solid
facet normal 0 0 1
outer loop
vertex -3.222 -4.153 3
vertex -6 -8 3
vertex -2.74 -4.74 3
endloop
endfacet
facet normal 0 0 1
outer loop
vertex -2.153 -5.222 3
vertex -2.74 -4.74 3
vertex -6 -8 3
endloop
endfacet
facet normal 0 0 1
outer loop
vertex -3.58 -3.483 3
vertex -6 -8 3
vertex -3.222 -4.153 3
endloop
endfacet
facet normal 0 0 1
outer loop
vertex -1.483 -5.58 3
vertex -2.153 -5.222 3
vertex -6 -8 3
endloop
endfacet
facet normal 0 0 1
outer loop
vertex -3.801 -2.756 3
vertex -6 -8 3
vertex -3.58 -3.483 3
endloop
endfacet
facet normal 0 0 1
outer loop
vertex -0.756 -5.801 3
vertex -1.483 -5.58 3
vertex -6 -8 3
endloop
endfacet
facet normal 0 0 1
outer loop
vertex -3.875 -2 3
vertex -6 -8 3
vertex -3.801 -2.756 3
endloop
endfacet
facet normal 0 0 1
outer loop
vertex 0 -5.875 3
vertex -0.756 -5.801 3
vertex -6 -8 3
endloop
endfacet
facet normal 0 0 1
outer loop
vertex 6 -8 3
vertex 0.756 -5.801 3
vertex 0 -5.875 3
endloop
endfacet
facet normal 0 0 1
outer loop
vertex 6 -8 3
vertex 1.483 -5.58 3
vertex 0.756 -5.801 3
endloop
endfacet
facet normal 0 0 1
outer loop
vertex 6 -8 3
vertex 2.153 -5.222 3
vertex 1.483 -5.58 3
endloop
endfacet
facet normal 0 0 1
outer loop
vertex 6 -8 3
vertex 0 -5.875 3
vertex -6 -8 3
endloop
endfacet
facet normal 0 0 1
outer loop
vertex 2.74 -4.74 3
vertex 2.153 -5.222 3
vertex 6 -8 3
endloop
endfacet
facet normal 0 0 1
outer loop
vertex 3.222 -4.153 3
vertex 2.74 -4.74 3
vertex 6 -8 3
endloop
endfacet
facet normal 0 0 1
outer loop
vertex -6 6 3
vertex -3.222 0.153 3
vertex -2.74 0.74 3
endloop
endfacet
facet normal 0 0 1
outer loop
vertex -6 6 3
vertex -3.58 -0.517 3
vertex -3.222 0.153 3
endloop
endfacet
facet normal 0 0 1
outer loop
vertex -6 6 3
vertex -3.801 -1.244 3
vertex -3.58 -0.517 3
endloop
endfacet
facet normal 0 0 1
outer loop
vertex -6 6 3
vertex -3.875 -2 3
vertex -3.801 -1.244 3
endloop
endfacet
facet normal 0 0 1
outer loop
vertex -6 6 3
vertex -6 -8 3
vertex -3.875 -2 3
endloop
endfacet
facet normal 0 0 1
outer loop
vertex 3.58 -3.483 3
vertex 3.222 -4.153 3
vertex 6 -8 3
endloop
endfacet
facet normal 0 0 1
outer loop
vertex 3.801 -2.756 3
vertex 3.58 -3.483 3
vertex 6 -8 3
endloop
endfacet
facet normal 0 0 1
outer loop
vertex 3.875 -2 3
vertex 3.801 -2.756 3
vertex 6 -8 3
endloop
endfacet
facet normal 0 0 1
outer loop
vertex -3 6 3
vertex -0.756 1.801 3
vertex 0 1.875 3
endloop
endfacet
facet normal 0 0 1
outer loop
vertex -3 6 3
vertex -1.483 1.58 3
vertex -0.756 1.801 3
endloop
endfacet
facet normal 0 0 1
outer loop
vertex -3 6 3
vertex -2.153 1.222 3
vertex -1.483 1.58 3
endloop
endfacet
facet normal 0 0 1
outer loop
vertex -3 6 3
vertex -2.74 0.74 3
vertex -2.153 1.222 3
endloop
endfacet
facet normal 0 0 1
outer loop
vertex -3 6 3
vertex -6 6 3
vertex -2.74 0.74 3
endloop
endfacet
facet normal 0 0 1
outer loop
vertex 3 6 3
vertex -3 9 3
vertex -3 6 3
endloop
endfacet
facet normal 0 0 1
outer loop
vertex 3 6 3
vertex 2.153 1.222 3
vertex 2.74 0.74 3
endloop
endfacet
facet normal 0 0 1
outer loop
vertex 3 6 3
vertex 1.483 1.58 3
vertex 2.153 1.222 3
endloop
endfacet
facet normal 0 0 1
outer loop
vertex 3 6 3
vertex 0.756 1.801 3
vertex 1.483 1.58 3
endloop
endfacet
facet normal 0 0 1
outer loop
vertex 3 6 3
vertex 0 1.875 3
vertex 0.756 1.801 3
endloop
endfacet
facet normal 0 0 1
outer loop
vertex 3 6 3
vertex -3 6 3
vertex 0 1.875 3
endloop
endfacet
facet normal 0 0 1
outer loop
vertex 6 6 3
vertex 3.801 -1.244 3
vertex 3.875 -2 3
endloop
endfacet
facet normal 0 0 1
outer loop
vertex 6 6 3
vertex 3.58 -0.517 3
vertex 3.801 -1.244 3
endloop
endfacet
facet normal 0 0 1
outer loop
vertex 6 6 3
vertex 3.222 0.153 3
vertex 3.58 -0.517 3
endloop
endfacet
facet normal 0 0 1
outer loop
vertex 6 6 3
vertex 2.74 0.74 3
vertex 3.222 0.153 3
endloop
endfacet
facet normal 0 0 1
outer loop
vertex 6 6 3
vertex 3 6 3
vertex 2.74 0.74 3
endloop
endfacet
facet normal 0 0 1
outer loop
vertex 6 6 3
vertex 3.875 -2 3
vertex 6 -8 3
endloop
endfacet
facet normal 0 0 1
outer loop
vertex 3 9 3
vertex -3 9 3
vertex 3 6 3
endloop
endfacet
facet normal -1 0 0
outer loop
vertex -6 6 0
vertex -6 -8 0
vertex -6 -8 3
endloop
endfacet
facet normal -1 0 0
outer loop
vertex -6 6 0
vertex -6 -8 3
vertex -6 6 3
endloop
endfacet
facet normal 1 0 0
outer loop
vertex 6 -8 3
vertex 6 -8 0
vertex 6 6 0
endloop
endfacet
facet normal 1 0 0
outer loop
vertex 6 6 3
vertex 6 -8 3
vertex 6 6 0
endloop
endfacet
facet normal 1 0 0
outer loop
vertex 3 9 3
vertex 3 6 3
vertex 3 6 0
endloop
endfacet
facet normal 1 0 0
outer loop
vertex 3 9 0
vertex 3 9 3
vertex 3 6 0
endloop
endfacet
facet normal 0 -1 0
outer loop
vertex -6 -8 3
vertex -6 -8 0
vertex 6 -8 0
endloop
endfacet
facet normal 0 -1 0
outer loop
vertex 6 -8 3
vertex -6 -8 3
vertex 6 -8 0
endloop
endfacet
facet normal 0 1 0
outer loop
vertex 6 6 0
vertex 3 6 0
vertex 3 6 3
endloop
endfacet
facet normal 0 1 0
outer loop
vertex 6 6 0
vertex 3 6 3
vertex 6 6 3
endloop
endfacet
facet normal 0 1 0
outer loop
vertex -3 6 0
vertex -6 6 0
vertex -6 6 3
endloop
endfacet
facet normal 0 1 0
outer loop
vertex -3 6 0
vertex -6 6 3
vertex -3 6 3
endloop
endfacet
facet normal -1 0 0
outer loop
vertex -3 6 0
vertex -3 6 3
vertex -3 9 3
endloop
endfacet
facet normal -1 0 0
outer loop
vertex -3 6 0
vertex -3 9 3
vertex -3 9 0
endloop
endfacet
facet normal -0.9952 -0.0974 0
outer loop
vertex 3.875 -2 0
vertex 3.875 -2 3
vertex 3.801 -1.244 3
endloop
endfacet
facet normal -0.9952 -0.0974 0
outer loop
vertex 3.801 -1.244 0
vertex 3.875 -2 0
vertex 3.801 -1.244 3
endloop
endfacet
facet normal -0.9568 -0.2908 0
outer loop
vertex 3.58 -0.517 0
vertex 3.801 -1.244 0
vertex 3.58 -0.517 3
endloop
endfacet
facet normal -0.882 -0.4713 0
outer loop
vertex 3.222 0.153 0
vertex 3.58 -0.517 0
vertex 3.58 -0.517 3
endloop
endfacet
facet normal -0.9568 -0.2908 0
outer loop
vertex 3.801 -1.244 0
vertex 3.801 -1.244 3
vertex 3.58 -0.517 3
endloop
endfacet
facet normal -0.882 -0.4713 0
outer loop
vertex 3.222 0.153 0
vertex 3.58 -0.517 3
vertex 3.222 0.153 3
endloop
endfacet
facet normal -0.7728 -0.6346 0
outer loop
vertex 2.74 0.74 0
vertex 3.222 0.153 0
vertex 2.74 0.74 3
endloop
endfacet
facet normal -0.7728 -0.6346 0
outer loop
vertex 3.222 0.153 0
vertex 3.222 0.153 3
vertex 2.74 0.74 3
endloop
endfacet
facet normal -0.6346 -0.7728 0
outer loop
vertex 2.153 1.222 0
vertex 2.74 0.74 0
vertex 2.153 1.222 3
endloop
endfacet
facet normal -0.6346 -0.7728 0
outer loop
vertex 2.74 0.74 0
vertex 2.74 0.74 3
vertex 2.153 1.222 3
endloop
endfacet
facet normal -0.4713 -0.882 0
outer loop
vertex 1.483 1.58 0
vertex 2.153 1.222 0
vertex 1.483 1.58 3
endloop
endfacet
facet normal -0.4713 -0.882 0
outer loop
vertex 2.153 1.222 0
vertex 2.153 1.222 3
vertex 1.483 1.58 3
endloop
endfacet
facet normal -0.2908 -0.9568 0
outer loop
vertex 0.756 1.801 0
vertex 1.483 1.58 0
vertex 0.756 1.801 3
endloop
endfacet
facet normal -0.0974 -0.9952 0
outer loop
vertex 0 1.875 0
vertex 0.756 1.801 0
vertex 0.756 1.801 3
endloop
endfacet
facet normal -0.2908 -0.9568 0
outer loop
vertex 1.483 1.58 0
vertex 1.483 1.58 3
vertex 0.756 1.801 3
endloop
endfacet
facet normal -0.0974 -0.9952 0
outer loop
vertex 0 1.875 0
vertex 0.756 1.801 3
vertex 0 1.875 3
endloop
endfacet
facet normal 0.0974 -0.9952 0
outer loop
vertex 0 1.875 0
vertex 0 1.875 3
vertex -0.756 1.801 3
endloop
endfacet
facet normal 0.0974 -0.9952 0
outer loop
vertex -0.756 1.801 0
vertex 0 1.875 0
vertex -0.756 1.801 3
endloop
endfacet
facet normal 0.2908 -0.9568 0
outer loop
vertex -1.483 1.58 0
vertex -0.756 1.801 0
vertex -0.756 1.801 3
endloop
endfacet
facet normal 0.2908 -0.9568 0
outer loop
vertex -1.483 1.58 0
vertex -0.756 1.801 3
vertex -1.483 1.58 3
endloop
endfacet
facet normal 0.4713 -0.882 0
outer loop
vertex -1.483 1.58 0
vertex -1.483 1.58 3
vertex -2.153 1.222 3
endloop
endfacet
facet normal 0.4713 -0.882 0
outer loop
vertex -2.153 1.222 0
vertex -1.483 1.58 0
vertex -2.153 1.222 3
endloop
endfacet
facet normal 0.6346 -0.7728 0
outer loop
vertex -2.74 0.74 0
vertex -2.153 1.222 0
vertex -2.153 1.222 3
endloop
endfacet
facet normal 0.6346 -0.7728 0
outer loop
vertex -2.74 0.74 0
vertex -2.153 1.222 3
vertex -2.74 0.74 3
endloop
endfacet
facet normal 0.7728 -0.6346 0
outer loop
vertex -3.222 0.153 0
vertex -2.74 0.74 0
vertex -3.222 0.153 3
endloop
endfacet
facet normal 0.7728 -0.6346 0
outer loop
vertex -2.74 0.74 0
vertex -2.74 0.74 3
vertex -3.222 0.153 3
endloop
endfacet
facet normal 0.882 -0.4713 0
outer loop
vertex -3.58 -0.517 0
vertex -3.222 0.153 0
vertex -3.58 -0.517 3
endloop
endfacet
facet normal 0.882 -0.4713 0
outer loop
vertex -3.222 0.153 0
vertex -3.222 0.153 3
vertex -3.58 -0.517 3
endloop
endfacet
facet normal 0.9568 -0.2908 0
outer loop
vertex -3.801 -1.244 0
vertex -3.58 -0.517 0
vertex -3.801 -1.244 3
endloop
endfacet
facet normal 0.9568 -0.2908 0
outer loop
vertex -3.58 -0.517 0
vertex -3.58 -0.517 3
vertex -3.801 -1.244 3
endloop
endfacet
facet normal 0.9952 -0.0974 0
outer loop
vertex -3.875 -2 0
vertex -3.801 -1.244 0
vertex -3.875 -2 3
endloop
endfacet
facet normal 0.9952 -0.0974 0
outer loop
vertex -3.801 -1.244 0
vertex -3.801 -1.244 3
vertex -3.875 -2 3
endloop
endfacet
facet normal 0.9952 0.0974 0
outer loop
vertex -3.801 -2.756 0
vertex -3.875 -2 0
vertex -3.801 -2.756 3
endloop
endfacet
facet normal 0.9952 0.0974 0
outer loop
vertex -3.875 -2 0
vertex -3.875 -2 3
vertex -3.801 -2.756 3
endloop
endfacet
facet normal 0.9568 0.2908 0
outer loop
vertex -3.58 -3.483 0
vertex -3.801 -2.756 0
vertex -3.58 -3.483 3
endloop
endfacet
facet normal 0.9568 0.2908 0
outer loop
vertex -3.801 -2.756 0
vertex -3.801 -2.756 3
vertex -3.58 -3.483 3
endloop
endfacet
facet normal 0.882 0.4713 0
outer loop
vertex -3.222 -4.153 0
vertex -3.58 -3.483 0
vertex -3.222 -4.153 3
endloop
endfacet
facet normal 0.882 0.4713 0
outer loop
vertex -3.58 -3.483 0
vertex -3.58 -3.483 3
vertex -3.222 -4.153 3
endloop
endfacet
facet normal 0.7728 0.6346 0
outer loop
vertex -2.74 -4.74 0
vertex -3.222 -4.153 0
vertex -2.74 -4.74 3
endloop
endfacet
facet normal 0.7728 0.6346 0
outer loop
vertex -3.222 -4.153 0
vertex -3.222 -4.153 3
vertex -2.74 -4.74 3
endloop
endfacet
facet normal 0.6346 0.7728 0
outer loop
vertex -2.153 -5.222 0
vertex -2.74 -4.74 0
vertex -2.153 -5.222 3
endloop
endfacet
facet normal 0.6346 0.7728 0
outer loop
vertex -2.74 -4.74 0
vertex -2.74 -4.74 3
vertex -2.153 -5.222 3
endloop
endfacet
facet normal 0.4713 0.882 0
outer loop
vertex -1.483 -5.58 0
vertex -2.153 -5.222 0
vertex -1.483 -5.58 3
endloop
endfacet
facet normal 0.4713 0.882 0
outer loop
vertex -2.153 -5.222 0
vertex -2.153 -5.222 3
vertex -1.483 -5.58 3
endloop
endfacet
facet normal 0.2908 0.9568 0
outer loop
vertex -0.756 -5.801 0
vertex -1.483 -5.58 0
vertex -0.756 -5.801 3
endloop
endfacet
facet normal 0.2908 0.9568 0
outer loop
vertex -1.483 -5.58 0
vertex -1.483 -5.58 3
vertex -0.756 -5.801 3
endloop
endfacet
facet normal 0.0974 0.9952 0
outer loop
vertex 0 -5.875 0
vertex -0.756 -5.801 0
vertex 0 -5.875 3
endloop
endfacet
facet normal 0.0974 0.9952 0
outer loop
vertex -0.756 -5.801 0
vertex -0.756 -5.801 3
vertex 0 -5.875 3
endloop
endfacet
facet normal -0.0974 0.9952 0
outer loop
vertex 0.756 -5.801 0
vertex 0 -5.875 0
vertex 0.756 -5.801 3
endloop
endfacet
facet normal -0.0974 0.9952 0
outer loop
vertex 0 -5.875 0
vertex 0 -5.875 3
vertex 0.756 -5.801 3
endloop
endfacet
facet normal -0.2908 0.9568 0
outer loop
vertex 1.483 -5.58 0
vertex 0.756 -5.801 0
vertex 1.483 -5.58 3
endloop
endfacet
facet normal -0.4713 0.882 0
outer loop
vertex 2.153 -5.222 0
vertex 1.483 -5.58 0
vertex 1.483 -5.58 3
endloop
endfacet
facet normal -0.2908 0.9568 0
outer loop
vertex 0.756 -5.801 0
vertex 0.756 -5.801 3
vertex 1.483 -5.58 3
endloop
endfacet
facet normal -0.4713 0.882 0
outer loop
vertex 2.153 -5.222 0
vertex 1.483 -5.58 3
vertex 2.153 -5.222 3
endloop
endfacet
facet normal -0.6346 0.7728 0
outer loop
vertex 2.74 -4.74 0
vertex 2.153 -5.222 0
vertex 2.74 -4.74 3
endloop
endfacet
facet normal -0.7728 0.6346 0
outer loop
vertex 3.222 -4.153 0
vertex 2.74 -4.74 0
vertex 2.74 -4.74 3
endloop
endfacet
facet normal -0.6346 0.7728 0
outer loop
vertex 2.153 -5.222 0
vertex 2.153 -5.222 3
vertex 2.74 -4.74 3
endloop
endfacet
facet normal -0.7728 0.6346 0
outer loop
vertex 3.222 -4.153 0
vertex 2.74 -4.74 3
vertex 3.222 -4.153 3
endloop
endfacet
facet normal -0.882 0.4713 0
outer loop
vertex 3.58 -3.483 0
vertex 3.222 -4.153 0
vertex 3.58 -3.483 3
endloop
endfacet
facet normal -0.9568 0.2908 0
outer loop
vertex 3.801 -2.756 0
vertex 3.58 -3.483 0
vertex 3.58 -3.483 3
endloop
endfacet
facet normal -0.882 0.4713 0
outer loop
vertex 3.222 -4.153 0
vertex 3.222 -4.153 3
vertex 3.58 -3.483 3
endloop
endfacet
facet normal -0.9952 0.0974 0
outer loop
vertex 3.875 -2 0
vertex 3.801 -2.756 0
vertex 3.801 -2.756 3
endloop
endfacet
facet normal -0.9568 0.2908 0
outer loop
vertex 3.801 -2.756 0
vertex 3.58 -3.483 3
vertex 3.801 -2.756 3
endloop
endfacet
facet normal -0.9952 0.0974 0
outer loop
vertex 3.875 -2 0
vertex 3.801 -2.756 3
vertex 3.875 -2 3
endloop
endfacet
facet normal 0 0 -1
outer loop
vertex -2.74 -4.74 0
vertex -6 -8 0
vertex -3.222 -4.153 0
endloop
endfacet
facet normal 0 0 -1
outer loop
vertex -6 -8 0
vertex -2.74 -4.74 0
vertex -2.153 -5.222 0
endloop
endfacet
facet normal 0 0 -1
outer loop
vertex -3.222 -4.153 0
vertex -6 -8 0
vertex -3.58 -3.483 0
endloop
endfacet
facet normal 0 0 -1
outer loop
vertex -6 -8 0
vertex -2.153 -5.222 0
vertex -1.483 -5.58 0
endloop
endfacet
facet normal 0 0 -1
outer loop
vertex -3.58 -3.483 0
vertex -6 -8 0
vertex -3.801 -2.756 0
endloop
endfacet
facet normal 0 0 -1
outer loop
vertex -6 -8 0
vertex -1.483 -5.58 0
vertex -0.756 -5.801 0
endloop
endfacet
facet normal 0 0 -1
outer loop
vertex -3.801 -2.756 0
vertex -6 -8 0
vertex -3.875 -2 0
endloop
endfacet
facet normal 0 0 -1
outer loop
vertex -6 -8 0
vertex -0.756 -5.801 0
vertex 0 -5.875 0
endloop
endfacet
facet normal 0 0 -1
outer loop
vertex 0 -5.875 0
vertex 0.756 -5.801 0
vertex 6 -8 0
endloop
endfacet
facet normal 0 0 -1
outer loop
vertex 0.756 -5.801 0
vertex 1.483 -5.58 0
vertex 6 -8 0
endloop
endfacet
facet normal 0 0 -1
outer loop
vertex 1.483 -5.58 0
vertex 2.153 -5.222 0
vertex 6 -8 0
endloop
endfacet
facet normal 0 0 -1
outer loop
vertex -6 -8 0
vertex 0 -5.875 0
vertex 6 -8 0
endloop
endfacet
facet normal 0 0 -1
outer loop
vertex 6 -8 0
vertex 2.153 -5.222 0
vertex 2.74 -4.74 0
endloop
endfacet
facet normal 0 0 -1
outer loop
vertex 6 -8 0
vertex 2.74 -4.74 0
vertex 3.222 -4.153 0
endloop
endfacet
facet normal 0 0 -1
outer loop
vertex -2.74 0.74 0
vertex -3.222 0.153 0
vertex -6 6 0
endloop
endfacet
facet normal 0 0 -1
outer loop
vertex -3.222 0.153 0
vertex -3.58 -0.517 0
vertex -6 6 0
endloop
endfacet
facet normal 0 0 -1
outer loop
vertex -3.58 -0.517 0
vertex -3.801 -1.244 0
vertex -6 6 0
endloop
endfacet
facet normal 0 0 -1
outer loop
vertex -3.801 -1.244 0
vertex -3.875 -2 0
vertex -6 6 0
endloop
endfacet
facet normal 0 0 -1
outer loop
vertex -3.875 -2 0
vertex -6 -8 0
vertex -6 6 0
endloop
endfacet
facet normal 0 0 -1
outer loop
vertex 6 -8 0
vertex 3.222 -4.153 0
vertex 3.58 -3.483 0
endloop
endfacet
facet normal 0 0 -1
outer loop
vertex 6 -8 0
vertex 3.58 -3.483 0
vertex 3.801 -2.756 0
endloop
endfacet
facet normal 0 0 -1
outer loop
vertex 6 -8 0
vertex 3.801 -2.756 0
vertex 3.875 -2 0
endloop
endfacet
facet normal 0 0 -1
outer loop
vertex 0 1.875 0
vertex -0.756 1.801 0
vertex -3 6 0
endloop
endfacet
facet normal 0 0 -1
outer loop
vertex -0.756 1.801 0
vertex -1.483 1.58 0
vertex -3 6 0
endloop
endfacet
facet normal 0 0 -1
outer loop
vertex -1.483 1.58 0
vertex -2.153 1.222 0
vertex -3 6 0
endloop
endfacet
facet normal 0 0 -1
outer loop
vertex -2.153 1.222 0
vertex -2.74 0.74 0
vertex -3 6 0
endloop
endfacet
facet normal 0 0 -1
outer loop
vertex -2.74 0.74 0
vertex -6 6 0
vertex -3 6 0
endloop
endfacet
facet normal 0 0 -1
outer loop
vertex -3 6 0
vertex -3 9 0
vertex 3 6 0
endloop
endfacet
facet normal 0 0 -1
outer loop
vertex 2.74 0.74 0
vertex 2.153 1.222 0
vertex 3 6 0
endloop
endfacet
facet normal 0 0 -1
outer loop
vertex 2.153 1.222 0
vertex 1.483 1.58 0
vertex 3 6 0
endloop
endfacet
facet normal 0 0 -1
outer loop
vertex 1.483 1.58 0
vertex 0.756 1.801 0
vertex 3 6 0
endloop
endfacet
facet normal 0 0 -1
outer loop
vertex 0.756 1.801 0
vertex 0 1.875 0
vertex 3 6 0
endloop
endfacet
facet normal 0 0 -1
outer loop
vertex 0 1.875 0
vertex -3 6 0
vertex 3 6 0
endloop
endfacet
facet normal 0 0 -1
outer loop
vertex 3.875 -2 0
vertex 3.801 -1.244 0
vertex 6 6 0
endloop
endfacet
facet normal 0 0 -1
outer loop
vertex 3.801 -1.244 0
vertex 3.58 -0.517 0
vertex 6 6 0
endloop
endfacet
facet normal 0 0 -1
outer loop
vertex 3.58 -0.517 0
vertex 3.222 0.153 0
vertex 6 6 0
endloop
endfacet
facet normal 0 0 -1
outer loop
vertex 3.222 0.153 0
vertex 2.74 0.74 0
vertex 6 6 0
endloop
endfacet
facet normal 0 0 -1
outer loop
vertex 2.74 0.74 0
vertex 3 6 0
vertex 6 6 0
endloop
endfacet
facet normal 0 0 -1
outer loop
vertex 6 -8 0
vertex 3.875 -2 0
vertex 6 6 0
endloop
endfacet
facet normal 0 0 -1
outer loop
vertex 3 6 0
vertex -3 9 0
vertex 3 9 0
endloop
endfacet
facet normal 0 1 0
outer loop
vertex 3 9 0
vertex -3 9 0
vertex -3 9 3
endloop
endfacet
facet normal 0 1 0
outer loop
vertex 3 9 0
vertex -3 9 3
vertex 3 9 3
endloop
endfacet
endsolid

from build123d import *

# Parameters (mm, degrees)
SKETCH1_W           = 12
SKETCH1_H           = 14
BOSS_EXTRUDE1_DEPTH = 3
SKETCH2_R           = 3.875
CUT_EXTRUDE1_DEPTH  = 3
SKETCH3_W           = 6
SKETCH3_H           = 3
BOSS_EXTRUDE2_DEPTH = 3


with BuildPart() as part:
    # Sketch1 → Boss-Extrude1 (new body)
    with BuildSketch(Plane.XY):
        with Locations((0, -1)):
            Rectangle(SKETCH1_W, SKETCH1_H)
    extrude(amount=BOSS_EXTRUDE1_DEPTH)

    # Sketch2 → Cut-Extrude1 (cut)
    with BuildSketch(Plane.XY.offset(3)):
        with Locations((0, -2)):
            Circle(SKETCH2_R)
    extrude(amount=-CUT_EXTRUDE1_DEPTH, mode=Mode.SUBTRACT)

    # Sketch3 → Boss-Extrude2 (add)
    with BuildSketch(Plane(origin=(0, 6, 0), x_dir=(1, 0, 0), z_dir=(0, 1, 0))):
        with Locations((0, -1.5)):
            Rectangle(SKETCH3_W, SKETCH3_H)
    extrude(amount=BOSS_EXTRUDE2_DEPTH)


solid = part.part
